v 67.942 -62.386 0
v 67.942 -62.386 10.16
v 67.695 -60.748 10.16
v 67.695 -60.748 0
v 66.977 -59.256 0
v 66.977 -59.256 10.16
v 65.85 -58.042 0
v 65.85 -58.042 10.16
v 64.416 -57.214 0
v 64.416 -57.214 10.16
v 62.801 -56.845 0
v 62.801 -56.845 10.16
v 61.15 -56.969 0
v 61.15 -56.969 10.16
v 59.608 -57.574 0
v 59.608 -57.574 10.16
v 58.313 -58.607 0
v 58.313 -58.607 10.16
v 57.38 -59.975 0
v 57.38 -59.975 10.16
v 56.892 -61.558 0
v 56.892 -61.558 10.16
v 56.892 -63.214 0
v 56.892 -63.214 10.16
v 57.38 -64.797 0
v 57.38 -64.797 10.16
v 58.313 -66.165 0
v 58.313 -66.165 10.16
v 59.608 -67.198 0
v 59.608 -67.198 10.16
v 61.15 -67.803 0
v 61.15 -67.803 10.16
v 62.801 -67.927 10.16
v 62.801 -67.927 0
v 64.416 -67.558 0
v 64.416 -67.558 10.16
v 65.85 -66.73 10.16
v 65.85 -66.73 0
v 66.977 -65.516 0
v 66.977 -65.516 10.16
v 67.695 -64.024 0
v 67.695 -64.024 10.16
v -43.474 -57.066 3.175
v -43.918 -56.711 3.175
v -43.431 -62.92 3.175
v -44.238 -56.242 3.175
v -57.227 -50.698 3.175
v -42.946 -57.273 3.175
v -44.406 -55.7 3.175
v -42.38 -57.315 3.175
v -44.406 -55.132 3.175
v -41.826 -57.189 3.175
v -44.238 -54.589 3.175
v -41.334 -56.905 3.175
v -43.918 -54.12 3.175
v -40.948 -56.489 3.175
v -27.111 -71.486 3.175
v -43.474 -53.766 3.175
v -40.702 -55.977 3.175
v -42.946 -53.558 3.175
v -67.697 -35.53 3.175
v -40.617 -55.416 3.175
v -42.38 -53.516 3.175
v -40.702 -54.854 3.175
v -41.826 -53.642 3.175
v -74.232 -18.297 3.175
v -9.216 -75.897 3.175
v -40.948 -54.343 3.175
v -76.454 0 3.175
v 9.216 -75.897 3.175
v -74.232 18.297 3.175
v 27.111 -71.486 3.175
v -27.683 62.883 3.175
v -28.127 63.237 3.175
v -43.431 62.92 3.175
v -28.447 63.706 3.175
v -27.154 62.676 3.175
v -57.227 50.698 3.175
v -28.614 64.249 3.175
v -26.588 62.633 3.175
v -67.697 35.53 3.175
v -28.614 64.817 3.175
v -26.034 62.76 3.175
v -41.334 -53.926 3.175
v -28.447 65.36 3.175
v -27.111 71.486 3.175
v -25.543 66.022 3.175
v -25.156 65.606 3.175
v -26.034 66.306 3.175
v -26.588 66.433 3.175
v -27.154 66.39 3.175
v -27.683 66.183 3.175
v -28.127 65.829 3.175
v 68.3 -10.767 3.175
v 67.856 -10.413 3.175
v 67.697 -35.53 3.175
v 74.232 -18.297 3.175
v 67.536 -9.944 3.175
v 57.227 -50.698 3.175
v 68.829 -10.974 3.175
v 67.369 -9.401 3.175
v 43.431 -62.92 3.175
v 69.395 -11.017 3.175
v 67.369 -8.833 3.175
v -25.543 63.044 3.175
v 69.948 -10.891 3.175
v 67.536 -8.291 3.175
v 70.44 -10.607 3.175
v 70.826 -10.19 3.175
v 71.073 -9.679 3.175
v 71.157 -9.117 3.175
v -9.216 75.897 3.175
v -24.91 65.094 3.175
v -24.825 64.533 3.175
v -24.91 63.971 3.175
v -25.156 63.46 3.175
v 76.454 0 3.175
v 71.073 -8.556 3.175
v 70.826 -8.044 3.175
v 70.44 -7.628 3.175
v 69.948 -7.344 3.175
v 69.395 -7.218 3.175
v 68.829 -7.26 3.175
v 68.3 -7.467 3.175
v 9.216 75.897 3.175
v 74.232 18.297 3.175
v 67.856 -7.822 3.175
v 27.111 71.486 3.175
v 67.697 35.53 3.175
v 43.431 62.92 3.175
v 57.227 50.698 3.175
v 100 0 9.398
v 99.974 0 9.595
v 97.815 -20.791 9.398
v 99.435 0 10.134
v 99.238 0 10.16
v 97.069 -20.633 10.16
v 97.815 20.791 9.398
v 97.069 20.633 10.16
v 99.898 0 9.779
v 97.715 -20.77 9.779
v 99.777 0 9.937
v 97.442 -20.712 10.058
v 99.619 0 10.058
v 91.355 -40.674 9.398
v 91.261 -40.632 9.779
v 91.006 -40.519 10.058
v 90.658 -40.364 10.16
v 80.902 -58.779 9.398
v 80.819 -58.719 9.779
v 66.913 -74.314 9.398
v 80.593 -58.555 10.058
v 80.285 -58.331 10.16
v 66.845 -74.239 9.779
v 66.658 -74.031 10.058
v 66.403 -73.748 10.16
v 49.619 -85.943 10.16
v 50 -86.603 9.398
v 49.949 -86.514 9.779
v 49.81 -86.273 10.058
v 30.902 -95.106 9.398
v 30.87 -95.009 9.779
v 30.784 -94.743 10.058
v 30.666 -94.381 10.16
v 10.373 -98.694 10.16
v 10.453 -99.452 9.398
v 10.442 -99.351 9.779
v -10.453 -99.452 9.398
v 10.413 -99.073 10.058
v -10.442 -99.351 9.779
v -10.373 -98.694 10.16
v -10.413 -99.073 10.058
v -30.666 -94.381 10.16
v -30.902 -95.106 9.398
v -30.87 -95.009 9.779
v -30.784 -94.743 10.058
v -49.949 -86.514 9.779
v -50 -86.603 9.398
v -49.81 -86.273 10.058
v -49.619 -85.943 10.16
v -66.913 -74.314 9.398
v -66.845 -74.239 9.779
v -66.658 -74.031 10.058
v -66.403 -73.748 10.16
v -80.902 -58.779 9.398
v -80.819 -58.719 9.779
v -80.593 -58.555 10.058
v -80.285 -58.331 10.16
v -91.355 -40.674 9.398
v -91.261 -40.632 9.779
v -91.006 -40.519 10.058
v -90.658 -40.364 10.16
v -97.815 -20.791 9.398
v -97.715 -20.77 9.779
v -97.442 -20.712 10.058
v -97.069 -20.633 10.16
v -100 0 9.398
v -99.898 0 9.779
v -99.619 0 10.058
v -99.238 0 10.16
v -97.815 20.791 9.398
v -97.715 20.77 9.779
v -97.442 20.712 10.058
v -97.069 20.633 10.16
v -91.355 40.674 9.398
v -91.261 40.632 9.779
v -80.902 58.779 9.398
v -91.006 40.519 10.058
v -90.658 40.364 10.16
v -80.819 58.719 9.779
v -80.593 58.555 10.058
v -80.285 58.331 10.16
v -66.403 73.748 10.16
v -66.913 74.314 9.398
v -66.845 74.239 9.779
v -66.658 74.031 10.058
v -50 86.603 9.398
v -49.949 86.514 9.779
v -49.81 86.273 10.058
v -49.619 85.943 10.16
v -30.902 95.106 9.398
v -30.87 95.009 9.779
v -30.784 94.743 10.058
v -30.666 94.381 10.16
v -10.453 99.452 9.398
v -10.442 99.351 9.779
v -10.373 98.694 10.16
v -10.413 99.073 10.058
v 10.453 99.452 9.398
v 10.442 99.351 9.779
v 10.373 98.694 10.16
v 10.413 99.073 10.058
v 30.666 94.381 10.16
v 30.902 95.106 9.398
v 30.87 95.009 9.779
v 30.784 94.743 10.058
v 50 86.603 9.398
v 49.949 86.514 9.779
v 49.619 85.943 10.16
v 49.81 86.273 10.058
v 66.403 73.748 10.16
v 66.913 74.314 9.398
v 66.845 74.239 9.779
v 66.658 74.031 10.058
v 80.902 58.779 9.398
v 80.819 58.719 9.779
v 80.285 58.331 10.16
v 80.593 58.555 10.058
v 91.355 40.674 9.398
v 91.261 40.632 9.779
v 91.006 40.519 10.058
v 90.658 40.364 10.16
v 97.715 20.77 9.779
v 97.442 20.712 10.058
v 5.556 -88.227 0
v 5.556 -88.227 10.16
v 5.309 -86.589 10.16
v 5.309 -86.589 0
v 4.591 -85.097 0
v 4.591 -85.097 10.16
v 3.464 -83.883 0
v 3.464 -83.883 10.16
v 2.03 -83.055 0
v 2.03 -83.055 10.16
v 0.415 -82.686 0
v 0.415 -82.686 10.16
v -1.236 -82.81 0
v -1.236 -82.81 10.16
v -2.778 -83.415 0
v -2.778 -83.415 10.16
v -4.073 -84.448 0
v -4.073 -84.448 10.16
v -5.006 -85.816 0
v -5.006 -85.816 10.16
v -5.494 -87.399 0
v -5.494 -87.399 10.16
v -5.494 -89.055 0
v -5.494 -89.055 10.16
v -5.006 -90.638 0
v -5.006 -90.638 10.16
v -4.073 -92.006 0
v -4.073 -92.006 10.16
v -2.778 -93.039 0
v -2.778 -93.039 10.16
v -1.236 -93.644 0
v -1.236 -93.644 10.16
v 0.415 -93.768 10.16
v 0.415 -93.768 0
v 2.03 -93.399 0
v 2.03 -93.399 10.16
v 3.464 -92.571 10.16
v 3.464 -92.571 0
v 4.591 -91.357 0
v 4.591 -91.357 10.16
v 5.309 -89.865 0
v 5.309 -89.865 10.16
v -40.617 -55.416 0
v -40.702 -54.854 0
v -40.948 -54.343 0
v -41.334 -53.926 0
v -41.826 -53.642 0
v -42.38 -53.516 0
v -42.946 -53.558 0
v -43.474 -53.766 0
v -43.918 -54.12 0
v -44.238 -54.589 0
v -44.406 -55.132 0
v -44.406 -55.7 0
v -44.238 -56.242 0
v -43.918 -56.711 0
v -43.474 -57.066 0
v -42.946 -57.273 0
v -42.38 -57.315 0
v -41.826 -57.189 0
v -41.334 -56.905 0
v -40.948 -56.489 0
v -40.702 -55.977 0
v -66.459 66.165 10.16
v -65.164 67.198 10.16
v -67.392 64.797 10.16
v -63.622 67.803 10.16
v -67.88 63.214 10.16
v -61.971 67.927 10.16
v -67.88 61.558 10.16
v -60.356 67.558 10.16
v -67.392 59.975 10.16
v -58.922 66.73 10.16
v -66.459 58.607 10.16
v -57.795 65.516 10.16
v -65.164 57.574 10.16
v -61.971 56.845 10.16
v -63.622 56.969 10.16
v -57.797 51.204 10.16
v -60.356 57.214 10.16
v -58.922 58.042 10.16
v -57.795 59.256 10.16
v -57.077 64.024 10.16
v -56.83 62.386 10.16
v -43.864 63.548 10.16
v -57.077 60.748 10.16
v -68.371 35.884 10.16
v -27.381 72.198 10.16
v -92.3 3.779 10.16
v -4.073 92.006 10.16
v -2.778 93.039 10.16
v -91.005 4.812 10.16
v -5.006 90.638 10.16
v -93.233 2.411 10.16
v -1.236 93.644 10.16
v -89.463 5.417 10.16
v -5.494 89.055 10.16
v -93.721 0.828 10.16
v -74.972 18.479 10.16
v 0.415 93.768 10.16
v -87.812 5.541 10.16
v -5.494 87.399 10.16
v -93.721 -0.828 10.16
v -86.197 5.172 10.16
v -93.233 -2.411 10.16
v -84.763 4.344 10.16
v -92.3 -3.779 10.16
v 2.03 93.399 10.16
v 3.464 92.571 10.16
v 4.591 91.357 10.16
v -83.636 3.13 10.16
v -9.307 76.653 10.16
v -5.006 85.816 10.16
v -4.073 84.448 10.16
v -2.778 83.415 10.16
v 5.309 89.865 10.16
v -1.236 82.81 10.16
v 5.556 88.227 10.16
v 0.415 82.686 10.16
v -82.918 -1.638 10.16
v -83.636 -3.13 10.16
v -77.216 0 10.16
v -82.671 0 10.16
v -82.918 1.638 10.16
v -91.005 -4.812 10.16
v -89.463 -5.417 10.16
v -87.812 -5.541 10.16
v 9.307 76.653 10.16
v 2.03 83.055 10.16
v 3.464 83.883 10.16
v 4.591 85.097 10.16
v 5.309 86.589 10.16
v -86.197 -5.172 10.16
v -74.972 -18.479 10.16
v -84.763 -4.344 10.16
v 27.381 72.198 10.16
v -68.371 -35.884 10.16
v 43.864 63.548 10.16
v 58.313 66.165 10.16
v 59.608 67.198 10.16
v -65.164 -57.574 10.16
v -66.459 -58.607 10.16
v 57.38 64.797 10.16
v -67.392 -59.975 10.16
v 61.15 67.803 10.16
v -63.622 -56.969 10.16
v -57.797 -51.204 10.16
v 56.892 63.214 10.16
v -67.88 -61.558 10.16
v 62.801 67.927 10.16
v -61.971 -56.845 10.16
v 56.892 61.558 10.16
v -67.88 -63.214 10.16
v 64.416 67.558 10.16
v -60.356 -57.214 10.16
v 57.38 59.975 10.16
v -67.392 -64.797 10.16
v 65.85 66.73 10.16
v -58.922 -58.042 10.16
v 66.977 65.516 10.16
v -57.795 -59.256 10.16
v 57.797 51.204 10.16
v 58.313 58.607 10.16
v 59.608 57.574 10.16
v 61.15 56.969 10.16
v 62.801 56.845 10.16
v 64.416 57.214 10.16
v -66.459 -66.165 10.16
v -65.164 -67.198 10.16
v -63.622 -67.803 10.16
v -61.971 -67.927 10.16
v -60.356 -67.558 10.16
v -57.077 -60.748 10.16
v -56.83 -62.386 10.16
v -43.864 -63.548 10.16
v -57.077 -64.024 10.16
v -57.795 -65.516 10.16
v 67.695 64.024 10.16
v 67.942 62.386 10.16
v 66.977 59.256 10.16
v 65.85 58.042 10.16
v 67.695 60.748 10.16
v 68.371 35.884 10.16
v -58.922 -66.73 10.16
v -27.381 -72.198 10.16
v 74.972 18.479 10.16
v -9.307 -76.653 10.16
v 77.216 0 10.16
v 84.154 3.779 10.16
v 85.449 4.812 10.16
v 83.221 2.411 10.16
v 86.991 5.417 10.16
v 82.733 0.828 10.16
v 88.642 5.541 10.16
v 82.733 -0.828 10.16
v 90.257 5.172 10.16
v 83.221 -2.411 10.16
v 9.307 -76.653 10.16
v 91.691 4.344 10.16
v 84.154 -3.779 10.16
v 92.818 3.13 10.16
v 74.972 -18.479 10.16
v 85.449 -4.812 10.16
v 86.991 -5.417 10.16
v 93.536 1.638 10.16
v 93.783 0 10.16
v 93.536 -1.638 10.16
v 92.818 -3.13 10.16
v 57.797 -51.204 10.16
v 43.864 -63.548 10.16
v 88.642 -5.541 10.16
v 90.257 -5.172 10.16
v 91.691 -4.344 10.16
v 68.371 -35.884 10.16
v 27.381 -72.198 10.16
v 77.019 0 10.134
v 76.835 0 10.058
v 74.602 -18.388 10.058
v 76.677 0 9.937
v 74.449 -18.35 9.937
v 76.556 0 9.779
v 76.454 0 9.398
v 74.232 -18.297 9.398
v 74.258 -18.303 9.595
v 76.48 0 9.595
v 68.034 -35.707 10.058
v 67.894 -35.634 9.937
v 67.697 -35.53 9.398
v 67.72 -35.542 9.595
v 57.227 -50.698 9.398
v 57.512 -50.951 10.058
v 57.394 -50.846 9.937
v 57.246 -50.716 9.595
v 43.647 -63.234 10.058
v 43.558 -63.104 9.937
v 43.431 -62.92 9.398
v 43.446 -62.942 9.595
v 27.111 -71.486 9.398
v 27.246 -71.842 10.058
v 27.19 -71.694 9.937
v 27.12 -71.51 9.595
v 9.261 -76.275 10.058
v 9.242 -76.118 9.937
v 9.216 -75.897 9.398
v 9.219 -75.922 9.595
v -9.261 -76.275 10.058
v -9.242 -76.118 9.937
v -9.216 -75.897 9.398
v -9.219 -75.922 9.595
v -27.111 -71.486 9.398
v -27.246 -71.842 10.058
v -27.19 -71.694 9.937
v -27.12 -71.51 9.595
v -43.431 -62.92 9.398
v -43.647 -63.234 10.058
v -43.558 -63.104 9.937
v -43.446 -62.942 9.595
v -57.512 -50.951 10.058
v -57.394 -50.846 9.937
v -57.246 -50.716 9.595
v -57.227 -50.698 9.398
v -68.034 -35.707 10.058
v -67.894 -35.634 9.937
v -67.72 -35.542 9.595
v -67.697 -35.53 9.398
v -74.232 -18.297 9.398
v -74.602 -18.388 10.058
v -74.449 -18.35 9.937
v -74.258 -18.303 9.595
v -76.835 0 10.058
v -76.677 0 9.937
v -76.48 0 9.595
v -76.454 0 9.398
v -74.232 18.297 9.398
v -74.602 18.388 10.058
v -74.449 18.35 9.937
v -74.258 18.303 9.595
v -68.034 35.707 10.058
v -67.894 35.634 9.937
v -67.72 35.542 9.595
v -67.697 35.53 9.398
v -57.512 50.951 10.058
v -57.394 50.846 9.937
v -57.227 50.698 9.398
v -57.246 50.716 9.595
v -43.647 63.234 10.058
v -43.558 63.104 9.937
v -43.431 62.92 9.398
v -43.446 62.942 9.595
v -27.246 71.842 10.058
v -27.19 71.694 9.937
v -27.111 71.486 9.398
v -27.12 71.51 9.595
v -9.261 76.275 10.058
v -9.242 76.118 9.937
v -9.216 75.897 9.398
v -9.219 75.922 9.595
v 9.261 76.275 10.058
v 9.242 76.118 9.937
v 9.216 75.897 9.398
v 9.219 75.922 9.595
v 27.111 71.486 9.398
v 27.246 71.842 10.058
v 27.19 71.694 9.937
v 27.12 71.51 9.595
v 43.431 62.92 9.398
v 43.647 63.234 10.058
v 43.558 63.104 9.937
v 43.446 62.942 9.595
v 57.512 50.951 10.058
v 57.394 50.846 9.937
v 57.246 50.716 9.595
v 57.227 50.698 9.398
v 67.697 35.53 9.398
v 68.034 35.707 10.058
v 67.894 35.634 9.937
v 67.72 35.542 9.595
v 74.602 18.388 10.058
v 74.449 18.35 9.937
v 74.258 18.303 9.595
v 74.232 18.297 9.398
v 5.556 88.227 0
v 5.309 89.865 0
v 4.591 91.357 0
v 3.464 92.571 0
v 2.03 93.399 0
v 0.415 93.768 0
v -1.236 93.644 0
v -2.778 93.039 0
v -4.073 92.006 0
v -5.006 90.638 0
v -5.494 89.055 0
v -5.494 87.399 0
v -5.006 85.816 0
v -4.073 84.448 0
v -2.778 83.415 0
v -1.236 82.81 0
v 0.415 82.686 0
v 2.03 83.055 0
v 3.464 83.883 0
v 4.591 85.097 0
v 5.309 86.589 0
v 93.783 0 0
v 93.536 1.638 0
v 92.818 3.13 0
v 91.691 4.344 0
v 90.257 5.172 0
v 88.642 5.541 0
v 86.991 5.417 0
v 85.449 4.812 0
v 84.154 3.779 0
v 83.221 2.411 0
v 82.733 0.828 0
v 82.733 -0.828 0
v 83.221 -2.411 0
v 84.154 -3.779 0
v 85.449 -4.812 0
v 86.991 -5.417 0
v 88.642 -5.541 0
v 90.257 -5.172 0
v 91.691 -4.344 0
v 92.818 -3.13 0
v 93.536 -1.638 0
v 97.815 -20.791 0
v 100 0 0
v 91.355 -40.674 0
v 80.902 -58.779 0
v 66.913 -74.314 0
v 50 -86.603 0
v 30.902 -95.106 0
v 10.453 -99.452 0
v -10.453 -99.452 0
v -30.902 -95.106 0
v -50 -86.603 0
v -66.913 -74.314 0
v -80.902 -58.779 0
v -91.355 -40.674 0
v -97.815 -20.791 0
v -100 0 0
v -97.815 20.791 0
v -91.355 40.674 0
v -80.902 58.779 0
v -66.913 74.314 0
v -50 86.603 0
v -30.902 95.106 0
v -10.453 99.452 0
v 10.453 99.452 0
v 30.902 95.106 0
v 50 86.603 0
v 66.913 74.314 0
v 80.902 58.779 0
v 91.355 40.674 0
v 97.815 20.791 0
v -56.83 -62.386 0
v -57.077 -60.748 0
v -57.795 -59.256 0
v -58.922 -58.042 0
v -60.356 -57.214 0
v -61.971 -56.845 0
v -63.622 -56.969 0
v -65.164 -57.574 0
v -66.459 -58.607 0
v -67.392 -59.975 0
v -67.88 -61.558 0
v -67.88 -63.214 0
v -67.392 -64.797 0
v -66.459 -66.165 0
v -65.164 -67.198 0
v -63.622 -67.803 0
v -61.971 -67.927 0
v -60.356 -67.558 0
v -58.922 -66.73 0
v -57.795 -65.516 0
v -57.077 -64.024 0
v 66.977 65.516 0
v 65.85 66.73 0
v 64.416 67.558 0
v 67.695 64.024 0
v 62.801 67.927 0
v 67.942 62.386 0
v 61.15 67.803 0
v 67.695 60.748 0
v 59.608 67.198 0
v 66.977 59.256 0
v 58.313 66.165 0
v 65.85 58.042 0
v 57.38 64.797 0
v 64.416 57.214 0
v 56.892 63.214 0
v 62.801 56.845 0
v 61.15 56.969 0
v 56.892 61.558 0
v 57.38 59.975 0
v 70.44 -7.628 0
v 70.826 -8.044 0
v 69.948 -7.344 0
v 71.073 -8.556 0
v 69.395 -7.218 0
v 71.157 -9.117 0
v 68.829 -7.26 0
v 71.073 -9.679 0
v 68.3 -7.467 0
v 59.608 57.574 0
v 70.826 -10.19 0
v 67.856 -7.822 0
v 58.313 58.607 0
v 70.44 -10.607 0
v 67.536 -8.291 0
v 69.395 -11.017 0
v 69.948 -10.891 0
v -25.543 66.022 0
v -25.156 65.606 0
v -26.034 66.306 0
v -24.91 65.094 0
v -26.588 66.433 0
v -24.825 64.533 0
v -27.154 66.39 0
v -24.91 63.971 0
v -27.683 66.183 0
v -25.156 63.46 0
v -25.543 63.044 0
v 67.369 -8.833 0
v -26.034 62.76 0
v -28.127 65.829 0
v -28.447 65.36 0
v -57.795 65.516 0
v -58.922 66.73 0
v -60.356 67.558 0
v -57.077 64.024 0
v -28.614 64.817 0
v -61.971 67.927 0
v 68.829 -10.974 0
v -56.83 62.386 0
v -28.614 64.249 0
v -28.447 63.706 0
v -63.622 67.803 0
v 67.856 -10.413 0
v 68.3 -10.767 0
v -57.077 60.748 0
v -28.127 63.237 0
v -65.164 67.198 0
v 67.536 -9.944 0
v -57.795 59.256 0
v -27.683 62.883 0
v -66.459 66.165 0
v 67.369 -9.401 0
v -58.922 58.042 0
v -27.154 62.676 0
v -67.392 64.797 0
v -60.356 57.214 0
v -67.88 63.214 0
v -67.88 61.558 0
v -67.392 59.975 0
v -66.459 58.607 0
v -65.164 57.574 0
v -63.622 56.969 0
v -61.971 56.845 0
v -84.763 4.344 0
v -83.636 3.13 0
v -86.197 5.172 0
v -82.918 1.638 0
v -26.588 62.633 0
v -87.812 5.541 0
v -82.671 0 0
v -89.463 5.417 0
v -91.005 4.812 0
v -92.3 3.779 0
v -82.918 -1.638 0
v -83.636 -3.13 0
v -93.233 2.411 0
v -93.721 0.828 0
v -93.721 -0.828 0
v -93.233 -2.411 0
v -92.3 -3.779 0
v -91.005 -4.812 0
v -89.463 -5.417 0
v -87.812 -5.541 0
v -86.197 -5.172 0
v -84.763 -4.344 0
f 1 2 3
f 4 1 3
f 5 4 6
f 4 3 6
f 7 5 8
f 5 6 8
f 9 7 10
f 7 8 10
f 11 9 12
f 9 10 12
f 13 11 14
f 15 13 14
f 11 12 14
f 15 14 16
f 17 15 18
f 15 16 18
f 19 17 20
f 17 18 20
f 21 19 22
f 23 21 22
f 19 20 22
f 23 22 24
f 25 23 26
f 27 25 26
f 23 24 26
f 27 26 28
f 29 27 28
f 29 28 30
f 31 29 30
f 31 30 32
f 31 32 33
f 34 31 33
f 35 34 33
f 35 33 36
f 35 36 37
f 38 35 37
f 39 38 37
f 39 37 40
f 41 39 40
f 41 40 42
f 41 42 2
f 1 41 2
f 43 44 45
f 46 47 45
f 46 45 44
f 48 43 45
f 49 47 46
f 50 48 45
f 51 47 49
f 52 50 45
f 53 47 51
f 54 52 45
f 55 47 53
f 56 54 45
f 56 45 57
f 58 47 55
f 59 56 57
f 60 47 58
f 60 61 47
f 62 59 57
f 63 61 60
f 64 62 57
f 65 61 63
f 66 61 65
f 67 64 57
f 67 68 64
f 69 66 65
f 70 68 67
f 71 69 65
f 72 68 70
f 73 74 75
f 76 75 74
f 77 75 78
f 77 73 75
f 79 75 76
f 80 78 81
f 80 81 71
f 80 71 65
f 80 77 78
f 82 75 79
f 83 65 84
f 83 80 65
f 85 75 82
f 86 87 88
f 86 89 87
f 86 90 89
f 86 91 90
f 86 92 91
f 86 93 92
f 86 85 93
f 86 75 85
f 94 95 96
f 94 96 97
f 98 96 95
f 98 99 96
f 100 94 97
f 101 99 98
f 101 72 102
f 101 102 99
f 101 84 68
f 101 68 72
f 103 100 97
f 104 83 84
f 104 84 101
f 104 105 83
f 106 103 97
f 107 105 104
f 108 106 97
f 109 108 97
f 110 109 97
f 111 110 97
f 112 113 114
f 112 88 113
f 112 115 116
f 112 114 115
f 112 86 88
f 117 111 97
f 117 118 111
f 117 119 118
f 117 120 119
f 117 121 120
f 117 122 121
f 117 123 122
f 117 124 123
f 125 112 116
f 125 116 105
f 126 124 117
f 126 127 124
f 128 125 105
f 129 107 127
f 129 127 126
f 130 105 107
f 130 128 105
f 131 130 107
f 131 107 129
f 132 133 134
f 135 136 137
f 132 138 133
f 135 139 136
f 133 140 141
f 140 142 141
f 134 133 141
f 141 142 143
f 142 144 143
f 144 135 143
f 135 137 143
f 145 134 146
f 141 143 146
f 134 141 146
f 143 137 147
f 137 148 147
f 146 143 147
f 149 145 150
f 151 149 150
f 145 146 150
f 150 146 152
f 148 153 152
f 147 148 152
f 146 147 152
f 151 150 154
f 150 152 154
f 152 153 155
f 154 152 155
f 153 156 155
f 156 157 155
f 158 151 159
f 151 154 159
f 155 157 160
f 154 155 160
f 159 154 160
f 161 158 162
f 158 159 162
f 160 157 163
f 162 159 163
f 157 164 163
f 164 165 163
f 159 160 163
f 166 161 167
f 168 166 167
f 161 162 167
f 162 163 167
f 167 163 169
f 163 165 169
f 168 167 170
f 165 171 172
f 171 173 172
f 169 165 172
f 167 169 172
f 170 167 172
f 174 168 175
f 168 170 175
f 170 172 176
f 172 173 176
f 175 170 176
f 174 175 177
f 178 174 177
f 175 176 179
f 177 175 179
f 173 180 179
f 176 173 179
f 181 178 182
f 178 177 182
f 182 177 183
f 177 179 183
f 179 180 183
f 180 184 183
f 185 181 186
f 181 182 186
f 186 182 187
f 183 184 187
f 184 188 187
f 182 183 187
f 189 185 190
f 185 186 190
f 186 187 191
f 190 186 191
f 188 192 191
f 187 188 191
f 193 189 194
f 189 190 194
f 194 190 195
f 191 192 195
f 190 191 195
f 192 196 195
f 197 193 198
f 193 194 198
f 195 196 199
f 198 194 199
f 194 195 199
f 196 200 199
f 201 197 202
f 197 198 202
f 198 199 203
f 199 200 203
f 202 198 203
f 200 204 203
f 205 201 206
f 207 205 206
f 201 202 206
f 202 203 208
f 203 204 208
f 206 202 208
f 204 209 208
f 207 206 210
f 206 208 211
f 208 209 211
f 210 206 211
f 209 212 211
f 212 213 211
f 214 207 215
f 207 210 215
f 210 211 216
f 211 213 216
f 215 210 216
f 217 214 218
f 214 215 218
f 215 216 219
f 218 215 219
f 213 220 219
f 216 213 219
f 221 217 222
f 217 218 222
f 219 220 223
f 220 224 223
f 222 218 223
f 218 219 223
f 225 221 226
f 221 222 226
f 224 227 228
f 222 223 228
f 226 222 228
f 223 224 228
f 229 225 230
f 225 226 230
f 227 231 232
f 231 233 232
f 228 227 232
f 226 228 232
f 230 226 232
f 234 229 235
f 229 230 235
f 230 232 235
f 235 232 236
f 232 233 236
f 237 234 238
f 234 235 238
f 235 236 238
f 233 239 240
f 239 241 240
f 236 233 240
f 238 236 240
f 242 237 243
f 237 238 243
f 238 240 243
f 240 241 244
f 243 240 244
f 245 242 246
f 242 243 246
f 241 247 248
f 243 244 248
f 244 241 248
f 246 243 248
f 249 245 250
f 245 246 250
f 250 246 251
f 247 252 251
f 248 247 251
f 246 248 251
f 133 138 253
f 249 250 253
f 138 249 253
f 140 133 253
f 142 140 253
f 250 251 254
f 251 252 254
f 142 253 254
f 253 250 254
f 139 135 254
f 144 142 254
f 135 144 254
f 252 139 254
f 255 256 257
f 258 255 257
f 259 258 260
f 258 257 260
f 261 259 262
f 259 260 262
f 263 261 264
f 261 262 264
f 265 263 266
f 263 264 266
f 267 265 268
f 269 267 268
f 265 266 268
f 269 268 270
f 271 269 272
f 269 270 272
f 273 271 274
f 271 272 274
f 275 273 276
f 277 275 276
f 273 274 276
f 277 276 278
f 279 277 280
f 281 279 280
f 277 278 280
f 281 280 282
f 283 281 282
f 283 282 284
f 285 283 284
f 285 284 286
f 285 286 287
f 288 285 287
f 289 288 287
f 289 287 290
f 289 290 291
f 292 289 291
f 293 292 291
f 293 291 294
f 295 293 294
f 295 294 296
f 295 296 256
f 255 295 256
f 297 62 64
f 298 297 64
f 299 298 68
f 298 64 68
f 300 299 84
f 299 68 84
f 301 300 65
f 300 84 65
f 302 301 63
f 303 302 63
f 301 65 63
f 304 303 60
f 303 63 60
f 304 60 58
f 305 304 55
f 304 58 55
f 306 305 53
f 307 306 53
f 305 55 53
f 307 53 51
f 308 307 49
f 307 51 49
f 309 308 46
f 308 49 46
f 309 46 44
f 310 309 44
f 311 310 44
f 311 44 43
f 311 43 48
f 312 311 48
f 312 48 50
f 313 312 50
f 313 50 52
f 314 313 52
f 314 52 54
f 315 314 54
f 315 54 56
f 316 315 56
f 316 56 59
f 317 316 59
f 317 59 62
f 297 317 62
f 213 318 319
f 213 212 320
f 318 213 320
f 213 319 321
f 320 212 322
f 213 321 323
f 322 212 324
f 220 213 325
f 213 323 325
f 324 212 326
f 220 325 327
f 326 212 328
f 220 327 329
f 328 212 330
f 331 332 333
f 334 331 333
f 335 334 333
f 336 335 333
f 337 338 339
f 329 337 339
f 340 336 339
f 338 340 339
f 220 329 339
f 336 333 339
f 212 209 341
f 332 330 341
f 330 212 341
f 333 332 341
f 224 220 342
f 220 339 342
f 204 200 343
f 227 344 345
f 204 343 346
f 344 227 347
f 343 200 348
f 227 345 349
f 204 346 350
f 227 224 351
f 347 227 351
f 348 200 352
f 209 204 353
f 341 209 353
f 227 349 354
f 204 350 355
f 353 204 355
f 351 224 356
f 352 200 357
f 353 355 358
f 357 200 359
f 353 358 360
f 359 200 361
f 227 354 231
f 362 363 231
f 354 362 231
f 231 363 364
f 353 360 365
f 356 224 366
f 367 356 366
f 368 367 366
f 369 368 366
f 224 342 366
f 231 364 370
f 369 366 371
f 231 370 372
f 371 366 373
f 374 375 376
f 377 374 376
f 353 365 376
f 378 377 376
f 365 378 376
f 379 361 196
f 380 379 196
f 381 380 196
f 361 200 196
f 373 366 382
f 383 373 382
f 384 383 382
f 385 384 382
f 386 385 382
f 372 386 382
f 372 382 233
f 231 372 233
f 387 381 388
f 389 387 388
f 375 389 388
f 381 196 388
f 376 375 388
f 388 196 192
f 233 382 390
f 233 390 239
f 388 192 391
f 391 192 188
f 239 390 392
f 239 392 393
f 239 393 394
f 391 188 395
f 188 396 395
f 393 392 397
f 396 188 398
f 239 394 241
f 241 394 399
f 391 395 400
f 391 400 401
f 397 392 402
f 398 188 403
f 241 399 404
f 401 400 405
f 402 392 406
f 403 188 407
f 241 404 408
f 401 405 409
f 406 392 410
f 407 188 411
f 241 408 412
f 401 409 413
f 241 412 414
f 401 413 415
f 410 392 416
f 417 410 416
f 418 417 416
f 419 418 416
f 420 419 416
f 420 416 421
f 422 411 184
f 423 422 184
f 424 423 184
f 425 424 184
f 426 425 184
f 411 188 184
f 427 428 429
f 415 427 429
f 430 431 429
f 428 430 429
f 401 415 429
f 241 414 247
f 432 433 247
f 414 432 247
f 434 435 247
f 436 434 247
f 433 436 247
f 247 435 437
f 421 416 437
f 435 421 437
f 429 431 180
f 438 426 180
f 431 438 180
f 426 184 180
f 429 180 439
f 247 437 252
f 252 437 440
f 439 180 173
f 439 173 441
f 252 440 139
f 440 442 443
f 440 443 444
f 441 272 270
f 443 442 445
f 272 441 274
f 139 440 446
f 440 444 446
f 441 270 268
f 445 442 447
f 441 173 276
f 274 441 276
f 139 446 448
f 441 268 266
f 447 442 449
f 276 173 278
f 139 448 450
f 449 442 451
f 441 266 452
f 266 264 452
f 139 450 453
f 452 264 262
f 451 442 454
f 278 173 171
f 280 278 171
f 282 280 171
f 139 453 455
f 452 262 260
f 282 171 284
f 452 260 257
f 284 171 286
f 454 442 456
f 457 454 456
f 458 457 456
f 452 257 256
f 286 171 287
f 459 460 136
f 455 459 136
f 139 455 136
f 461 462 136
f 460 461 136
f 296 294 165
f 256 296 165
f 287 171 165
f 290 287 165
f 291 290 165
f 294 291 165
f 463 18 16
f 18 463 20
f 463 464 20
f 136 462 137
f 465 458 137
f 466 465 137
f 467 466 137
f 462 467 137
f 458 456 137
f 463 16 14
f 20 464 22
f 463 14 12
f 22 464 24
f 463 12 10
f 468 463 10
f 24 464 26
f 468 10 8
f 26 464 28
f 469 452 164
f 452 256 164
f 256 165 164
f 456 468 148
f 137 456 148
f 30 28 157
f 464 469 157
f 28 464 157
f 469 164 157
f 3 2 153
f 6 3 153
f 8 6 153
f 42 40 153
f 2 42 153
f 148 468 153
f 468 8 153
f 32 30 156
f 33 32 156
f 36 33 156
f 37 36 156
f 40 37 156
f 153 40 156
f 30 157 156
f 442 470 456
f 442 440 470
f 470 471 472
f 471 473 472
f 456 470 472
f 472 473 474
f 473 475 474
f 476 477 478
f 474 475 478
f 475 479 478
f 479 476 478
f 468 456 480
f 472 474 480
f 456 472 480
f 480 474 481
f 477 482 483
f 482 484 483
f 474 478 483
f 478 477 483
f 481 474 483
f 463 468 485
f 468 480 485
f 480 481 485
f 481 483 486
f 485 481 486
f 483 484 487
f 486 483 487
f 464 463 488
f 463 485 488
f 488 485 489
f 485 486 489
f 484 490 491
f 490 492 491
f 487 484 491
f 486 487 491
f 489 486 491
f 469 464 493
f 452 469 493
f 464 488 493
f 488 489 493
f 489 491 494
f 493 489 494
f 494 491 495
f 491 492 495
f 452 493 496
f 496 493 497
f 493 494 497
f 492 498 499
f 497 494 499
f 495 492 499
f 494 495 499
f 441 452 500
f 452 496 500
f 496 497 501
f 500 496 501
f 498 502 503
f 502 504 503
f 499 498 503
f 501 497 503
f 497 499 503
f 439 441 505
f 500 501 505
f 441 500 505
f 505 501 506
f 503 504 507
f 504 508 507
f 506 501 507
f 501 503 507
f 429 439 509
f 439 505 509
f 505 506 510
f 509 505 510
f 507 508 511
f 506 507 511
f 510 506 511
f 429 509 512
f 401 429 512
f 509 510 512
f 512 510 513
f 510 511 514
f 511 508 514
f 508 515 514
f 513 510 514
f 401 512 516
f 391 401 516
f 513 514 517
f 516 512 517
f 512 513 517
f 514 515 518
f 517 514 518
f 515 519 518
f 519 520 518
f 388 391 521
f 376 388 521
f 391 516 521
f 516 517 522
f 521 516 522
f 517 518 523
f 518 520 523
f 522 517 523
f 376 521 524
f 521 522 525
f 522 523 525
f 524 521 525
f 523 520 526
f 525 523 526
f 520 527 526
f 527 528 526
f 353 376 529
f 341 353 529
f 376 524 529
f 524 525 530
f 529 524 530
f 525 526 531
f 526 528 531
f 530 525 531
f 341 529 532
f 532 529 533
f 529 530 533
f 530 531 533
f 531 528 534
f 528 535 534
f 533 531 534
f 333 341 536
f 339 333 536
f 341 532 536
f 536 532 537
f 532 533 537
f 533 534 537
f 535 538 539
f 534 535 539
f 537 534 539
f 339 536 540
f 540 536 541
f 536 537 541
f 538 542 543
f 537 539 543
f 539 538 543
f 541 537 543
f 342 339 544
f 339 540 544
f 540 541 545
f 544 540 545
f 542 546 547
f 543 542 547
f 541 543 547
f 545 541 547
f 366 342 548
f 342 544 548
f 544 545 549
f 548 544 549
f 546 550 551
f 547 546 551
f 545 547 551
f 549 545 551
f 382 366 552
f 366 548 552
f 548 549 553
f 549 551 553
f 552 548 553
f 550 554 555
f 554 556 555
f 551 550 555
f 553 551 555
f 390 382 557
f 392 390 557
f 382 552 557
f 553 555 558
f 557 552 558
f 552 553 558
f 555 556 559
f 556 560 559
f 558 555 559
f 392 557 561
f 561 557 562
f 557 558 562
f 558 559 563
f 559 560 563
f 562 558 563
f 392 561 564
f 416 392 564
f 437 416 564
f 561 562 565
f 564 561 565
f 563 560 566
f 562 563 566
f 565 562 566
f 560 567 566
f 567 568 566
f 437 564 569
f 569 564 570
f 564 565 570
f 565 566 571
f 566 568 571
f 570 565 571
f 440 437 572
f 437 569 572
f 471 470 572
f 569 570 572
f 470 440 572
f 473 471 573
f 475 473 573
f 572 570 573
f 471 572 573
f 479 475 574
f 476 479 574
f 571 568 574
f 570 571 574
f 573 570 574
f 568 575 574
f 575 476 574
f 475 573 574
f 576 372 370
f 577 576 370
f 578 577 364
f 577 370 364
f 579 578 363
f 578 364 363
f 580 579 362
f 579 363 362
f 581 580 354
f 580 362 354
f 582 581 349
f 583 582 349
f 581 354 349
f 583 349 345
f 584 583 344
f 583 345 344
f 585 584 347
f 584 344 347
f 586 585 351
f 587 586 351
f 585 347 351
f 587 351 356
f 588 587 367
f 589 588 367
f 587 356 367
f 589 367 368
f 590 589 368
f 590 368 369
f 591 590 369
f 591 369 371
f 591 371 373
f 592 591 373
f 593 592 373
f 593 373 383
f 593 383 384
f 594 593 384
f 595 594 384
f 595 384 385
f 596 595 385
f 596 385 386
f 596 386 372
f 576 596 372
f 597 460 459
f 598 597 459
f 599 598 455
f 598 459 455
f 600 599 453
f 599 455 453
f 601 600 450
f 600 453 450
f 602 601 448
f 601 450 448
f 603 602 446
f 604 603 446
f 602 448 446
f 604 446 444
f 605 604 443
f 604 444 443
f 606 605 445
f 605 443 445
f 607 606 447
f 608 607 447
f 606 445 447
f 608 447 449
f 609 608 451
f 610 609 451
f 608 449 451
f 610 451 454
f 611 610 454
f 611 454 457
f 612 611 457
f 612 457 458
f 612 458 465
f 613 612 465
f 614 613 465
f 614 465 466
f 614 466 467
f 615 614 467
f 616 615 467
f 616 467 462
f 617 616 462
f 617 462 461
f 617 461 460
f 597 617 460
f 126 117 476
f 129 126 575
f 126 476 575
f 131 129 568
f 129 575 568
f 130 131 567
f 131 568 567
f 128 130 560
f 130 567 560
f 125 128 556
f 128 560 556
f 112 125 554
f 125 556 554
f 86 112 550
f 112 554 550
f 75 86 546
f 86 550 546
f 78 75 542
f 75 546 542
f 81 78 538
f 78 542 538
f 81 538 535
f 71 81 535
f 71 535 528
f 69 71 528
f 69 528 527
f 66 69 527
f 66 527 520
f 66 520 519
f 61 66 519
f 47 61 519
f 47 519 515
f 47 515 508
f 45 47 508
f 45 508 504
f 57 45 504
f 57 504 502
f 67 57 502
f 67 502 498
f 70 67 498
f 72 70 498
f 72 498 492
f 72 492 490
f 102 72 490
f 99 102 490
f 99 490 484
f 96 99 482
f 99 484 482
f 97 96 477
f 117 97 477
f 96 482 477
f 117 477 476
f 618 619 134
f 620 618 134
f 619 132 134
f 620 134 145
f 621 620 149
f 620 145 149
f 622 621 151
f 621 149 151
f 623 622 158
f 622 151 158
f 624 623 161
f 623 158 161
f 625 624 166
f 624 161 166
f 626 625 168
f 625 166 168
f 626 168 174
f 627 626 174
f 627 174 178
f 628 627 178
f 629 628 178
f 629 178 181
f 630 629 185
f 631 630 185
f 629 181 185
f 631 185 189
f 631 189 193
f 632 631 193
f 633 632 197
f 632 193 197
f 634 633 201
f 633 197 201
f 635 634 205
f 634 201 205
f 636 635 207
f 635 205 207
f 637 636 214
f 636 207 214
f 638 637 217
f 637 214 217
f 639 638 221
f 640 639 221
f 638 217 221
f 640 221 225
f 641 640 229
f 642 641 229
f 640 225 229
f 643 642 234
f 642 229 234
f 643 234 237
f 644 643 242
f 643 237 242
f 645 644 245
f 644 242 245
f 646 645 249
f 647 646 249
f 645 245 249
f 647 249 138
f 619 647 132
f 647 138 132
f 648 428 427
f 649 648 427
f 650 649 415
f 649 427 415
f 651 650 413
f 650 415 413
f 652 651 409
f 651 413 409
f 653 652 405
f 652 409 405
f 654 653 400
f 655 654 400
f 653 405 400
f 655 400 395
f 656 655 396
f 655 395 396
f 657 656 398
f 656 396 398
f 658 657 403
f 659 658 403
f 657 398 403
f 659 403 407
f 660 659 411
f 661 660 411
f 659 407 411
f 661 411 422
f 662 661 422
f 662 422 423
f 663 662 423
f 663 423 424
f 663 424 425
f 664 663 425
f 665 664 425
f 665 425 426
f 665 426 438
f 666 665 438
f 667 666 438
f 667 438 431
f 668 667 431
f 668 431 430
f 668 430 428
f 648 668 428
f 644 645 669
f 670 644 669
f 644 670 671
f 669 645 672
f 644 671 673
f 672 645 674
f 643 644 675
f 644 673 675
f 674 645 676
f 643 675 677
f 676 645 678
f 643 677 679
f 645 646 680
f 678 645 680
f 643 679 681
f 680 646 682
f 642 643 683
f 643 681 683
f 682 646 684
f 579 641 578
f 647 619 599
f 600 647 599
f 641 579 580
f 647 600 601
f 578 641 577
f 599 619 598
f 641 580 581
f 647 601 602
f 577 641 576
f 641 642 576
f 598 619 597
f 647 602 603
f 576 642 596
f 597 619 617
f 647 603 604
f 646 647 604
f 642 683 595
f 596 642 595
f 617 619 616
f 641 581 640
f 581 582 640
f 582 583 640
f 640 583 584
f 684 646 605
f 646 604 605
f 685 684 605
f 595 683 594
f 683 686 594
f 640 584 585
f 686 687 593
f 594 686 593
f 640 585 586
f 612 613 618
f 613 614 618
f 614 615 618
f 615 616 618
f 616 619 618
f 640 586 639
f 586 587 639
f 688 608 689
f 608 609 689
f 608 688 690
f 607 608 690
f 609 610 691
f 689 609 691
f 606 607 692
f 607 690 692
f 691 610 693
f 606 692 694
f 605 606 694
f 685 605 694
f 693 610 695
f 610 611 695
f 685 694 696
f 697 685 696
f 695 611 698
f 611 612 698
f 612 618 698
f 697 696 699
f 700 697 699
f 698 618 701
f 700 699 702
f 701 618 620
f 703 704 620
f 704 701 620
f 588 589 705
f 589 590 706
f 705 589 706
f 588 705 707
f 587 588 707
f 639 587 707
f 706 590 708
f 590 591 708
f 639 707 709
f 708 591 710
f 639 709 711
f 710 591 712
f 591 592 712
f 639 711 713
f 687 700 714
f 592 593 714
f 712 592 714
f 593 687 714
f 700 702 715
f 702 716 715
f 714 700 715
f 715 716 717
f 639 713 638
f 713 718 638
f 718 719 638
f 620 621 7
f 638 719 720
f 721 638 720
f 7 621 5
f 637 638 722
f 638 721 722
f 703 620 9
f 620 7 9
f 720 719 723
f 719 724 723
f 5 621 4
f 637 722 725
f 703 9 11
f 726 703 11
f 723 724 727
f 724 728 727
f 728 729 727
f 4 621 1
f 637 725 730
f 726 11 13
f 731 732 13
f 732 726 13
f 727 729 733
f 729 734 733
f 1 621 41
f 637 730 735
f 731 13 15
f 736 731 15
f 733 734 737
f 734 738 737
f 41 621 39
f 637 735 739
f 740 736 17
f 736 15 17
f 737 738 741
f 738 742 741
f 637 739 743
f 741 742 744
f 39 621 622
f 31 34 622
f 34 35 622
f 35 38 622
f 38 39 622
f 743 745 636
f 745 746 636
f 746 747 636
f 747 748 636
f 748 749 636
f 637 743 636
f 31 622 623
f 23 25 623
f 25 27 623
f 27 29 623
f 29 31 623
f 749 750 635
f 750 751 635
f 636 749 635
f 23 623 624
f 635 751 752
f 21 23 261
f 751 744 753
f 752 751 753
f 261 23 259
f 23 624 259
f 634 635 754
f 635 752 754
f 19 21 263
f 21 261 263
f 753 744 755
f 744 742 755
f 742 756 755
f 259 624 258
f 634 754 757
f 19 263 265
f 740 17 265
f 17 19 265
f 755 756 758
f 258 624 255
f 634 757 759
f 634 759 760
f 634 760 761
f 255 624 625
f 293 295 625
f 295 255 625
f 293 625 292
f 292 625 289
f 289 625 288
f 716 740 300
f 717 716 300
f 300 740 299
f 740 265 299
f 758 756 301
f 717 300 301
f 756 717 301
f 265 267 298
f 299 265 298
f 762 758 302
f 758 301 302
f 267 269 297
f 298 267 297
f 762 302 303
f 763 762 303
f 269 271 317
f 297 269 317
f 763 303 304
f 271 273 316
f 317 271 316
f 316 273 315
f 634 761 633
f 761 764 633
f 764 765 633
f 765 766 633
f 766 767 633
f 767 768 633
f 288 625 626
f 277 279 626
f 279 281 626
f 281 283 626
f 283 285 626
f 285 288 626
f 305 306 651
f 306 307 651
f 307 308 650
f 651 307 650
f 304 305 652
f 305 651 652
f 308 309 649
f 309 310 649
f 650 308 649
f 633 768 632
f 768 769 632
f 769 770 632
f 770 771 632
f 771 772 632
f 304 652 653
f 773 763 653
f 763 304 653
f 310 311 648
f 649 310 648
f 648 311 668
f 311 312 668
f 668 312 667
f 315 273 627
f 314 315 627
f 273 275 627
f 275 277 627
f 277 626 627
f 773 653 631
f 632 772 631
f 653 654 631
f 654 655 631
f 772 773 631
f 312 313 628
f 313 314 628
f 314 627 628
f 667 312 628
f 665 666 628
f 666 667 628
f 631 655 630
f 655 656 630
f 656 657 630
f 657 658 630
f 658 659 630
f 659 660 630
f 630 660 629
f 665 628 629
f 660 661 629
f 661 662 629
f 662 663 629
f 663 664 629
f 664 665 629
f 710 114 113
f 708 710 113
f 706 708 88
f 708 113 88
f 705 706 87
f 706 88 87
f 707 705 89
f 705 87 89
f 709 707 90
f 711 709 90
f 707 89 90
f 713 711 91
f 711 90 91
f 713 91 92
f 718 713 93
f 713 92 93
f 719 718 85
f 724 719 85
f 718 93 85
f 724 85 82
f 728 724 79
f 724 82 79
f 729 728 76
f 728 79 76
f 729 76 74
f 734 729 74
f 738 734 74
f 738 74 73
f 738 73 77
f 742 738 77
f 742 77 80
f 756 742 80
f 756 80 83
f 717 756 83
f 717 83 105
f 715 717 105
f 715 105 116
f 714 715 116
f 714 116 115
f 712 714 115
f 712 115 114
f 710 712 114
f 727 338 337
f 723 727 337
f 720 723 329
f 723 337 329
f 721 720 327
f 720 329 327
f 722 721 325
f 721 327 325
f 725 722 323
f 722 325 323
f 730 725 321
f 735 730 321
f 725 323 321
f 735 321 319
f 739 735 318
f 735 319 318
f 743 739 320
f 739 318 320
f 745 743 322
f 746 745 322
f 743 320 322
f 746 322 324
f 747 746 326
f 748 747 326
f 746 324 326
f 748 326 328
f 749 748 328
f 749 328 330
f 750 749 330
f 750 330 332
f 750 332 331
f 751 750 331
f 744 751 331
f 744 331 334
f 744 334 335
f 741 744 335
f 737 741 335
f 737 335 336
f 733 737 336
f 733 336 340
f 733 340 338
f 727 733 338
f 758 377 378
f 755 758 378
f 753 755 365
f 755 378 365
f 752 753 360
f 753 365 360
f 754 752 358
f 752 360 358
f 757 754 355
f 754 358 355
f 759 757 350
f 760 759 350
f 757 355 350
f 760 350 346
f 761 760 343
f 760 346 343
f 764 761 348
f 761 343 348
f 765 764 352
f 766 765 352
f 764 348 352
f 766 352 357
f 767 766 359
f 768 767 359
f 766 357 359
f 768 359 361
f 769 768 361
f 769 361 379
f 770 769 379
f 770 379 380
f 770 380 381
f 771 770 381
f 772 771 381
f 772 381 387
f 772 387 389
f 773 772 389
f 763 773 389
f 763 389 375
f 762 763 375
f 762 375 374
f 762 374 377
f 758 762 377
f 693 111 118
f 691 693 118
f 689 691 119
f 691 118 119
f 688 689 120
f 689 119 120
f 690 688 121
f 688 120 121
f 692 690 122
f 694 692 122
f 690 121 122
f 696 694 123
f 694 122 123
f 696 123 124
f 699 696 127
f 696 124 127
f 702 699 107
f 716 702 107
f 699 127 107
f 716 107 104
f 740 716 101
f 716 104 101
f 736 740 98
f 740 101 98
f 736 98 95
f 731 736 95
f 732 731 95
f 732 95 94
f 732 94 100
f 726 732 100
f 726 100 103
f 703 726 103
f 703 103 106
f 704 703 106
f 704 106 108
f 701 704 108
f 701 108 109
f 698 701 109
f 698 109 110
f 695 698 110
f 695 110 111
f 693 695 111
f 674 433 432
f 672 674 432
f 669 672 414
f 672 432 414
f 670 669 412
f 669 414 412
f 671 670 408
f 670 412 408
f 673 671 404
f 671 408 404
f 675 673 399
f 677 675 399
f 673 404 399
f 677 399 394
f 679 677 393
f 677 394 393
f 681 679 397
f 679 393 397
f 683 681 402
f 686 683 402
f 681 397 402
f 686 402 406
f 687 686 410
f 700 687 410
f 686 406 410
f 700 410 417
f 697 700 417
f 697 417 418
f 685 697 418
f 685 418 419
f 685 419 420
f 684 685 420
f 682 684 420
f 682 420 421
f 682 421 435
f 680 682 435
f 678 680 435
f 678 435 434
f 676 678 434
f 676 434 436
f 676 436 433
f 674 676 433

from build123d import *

# Parameters (mm, degrees)
F2_R     = 76.454
F3_DEPTH = 6.35
F4_R     = 5.55625
F5_DEPTH = 10.161
F6_R     = 1.905
F7_DEPTH = 3.176


with BuildPart() as f1:
    # F0 (on Front) → F1 (revolve)
    with BuildSketch(Plane.XZ):
        with BuildLine():
            Line((0, 9.525), (0, 0))
            Line((0, 0), (100, 0))
            Line((100, 0), (100, 9.398))
            ThreePointArc((100, 9.398), (99.7768153673, 9.9368153673), (99.238, 10.16))
            Line((99.238, 10.16), (77.216, 10.16))
            ThreePointArc((77.216, 10.16), (76.6771846327, 9.9368153673), (76.454, 9.398))
            Line((76.454, 9.398), (76.454, 9.525))
            Line((76.454, 9.525), (0, 9.525))
        make_face()
    revolve(axis=Axis((0, 0, 85.8672061428), (0, 0, -1)))

    # F2 (on face) → F3 (cut)
    with BuildSketch(Plane.XY.offset(9.525)):
        Circle(F2_R)
    extrude(amount=-F3_DEPTH, mode=Mode.SUBTRACT)

    # F4 (on face) → F5 (cut, through all)
    with BuildSketch(Plane.XY.offset(10.16)):
        with Locations((0, 88.227)):
            Circle(F4_R)
        with Locations((-62.3859099837, 62.3859099837)):
            Circle(F4_R)
        with Locations((-88.227, 0)):
            Circle(F4_R)
        with Locations((-62.3859099837, -62.3859099837)):
            Circle(F4_R)
        with Locations((0, -88.227)):
            Circle(F4_R)
        with Locations((62.3859099837, -62.3859099837)):
            Circle(F4_R)
        with Locations((88.227, 0)):
            Circle(F4_R)
        with Locations((62.3859099837, 62.3859099837)):
            Circle(F4_R)
    extrude(amount=-F5_DEPTH, mode=Mode.SUBTRACT)

    # F6 (on face) → F7 (cut, through all)
    with BuildSketch(Plane.XY.offset(3.175)):
        with Locations((-26.7304377507, 64.5329853459)):
            Circle(F6_R)
        with Locations((-42.5219858163, -55.4157308193)):
            Circle(F6_R)
        with Locations((69.252423567, -9.1172545266)):
            Circle(F6_R)
    extrude(amount=-F7_DEPTH, mode=Mode.SUBTRACT)


solid = f1.part
